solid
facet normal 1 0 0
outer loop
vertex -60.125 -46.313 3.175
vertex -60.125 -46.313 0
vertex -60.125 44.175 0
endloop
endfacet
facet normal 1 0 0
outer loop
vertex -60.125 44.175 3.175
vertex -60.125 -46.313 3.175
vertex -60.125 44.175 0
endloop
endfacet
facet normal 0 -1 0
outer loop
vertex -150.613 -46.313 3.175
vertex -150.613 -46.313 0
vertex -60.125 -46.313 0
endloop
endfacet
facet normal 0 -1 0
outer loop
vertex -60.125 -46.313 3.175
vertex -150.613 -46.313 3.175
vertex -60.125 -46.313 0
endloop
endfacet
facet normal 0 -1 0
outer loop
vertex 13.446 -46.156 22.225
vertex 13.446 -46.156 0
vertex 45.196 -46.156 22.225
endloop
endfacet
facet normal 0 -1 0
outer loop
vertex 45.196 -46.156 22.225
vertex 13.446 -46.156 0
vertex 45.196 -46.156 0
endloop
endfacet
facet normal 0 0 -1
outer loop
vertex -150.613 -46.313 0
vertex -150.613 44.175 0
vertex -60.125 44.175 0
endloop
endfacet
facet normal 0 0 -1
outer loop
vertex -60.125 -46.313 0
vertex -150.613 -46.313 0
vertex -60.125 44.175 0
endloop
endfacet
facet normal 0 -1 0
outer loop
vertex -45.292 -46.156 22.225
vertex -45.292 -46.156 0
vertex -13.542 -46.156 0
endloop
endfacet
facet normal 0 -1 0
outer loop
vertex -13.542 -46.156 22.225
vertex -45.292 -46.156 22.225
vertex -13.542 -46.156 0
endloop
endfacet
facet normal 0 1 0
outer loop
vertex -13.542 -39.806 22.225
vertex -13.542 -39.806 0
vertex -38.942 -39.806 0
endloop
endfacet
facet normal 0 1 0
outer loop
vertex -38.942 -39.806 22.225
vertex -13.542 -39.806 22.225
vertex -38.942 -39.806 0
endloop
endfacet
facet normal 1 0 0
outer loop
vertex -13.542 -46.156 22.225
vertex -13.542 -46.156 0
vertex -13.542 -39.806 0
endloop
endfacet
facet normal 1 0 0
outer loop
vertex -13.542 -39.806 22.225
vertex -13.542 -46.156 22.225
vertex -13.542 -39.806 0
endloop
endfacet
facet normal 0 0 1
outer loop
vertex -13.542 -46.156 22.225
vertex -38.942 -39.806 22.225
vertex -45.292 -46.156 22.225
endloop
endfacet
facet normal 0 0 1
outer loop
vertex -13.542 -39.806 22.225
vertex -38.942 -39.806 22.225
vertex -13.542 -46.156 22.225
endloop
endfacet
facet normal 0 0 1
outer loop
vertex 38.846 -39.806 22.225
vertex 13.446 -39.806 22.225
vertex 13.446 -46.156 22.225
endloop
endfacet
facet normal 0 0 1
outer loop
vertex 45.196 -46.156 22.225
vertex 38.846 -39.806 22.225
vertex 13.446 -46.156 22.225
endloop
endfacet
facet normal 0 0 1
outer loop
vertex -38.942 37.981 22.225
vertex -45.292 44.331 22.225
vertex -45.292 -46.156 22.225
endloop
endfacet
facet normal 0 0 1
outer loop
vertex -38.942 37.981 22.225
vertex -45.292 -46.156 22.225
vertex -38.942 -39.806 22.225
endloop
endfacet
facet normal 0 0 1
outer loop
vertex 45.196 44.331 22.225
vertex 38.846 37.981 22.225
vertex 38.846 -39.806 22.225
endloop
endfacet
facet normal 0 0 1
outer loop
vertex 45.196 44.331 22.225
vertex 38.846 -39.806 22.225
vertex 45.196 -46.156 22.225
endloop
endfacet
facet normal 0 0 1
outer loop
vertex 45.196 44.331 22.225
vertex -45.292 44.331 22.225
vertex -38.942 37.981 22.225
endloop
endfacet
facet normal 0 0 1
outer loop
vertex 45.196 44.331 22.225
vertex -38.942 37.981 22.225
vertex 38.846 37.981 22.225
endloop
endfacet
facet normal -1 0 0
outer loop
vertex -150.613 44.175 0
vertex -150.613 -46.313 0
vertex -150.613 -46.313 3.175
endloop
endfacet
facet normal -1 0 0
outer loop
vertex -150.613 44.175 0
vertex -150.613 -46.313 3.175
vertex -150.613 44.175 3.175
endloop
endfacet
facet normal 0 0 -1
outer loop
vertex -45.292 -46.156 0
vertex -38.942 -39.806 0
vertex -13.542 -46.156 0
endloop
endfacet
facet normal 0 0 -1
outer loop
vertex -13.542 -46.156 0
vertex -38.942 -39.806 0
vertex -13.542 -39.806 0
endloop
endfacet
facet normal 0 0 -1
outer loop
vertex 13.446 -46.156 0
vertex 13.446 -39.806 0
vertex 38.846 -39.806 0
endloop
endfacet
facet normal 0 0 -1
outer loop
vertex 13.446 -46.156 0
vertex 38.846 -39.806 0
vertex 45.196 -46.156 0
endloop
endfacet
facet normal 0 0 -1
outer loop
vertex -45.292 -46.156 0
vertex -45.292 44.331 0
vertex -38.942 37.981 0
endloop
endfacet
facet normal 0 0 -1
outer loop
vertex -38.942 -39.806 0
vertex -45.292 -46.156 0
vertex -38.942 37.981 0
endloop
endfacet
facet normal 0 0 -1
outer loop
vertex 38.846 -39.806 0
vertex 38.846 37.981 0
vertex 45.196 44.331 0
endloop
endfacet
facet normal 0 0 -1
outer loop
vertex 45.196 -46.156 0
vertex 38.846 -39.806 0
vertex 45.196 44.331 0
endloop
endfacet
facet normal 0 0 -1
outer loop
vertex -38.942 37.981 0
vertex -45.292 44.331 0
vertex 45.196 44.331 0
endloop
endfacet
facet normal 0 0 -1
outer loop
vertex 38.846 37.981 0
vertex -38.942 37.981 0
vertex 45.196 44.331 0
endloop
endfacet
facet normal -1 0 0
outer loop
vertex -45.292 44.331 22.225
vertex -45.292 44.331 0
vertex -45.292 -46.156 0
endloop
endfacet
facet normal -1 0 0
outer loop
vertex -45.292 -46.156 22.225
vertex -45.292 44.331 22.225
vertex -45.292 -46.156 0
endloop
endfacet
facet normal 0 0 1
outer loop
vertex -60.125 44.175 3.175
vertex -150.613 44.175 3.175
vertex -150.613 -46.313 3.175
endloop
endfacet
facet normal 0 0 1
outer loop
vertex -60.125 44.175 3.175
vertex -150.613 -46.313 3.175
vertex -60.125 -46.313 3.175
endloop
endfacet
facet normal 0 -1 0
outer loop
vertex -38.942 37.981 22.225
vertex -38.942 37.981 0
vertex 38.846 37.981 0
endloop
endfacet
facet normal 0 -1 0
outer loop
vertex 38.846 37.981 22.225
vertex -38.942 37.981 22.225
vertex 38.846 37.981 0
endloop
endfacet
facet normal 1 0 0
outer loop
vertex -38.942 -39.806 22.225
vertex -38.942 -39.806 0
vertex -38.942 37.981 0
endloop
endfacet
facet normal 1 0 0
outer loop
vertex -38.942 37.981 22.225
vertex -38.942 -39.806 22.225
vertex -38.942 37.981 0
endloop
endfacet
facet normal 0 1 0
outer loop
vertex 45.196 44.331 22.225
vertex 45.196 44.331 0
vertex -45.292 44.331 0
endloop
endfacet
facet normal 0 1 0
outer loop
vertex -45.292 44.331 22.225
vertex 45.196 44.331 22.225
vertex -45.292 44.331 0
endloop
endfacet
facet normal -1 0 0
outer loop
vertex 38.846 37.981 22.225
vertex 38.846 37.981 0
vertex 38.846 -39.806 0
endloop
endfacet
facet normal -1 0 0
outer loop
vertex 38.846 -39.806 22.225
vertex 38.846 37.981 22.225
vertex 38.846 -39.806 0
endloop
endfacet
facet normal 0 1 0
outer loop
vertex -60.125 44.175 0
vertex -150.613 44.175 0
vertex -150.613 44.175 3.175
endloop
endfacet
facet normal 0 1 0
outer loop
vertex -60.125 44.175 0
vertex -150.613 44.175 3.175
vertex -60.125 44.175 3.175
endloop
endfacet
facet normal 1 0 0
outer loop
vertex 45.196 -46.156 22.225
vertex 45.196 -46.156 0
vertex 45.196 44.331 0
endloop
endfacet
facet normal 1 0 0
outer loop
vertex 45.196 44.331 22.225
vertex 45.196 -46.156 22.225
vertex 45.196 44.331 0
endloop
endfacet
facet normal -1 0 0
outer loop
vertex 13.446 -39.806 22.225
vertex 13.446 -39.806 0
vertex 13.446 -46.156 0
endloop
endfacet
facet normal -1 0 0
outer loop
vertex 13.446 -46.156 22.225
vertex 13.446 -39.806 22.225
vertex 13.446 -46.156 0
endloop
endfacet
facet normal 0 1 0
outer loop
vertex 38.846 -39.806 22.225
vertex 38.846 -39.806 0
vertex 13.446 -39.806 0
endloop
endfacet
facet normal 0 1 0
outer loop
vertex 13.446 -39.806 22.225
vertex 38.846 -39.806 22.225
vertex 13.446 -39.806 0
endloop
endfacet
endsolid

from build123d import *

# Parameters (mm, degrees)
F0_W     = 90.4875
F0_H     = 90.4875
F1_DEPTH = 3.175
F2_DEPTH = 22.225


with BuildPart() as f1:
    # F0 (on Top) → F1 (new body)
    with BuildSketch(Plane.XY):
        with Locations((-105.369041, -1.068996)):
            Rectangle(F0_W, F0_H)
    extrude(amount=F1_DEPTH)


with BuildPart() as f2:
    # F0 (on Top) → F2 (new body)
    with BuildSketch(Plane.XY):
        Polygon((45.195677, 44.331089), (-45.291823, 44.331089), (-45.291823, -46.156411), (-13.541823, -46.156411), (-13.541823, -39.806411), (-38.941823, -39.806411), (-38.941823, 37.981089), (38.845677, 37.981089), (38.845677, -39.806411), (13.445677, -39.806411), (13.445677, -46.156411), (45.195677, -46.156411), align=None)
    extrude(amount=F2_DEPTH)


solid = Compound([f1.part, f2.part])
